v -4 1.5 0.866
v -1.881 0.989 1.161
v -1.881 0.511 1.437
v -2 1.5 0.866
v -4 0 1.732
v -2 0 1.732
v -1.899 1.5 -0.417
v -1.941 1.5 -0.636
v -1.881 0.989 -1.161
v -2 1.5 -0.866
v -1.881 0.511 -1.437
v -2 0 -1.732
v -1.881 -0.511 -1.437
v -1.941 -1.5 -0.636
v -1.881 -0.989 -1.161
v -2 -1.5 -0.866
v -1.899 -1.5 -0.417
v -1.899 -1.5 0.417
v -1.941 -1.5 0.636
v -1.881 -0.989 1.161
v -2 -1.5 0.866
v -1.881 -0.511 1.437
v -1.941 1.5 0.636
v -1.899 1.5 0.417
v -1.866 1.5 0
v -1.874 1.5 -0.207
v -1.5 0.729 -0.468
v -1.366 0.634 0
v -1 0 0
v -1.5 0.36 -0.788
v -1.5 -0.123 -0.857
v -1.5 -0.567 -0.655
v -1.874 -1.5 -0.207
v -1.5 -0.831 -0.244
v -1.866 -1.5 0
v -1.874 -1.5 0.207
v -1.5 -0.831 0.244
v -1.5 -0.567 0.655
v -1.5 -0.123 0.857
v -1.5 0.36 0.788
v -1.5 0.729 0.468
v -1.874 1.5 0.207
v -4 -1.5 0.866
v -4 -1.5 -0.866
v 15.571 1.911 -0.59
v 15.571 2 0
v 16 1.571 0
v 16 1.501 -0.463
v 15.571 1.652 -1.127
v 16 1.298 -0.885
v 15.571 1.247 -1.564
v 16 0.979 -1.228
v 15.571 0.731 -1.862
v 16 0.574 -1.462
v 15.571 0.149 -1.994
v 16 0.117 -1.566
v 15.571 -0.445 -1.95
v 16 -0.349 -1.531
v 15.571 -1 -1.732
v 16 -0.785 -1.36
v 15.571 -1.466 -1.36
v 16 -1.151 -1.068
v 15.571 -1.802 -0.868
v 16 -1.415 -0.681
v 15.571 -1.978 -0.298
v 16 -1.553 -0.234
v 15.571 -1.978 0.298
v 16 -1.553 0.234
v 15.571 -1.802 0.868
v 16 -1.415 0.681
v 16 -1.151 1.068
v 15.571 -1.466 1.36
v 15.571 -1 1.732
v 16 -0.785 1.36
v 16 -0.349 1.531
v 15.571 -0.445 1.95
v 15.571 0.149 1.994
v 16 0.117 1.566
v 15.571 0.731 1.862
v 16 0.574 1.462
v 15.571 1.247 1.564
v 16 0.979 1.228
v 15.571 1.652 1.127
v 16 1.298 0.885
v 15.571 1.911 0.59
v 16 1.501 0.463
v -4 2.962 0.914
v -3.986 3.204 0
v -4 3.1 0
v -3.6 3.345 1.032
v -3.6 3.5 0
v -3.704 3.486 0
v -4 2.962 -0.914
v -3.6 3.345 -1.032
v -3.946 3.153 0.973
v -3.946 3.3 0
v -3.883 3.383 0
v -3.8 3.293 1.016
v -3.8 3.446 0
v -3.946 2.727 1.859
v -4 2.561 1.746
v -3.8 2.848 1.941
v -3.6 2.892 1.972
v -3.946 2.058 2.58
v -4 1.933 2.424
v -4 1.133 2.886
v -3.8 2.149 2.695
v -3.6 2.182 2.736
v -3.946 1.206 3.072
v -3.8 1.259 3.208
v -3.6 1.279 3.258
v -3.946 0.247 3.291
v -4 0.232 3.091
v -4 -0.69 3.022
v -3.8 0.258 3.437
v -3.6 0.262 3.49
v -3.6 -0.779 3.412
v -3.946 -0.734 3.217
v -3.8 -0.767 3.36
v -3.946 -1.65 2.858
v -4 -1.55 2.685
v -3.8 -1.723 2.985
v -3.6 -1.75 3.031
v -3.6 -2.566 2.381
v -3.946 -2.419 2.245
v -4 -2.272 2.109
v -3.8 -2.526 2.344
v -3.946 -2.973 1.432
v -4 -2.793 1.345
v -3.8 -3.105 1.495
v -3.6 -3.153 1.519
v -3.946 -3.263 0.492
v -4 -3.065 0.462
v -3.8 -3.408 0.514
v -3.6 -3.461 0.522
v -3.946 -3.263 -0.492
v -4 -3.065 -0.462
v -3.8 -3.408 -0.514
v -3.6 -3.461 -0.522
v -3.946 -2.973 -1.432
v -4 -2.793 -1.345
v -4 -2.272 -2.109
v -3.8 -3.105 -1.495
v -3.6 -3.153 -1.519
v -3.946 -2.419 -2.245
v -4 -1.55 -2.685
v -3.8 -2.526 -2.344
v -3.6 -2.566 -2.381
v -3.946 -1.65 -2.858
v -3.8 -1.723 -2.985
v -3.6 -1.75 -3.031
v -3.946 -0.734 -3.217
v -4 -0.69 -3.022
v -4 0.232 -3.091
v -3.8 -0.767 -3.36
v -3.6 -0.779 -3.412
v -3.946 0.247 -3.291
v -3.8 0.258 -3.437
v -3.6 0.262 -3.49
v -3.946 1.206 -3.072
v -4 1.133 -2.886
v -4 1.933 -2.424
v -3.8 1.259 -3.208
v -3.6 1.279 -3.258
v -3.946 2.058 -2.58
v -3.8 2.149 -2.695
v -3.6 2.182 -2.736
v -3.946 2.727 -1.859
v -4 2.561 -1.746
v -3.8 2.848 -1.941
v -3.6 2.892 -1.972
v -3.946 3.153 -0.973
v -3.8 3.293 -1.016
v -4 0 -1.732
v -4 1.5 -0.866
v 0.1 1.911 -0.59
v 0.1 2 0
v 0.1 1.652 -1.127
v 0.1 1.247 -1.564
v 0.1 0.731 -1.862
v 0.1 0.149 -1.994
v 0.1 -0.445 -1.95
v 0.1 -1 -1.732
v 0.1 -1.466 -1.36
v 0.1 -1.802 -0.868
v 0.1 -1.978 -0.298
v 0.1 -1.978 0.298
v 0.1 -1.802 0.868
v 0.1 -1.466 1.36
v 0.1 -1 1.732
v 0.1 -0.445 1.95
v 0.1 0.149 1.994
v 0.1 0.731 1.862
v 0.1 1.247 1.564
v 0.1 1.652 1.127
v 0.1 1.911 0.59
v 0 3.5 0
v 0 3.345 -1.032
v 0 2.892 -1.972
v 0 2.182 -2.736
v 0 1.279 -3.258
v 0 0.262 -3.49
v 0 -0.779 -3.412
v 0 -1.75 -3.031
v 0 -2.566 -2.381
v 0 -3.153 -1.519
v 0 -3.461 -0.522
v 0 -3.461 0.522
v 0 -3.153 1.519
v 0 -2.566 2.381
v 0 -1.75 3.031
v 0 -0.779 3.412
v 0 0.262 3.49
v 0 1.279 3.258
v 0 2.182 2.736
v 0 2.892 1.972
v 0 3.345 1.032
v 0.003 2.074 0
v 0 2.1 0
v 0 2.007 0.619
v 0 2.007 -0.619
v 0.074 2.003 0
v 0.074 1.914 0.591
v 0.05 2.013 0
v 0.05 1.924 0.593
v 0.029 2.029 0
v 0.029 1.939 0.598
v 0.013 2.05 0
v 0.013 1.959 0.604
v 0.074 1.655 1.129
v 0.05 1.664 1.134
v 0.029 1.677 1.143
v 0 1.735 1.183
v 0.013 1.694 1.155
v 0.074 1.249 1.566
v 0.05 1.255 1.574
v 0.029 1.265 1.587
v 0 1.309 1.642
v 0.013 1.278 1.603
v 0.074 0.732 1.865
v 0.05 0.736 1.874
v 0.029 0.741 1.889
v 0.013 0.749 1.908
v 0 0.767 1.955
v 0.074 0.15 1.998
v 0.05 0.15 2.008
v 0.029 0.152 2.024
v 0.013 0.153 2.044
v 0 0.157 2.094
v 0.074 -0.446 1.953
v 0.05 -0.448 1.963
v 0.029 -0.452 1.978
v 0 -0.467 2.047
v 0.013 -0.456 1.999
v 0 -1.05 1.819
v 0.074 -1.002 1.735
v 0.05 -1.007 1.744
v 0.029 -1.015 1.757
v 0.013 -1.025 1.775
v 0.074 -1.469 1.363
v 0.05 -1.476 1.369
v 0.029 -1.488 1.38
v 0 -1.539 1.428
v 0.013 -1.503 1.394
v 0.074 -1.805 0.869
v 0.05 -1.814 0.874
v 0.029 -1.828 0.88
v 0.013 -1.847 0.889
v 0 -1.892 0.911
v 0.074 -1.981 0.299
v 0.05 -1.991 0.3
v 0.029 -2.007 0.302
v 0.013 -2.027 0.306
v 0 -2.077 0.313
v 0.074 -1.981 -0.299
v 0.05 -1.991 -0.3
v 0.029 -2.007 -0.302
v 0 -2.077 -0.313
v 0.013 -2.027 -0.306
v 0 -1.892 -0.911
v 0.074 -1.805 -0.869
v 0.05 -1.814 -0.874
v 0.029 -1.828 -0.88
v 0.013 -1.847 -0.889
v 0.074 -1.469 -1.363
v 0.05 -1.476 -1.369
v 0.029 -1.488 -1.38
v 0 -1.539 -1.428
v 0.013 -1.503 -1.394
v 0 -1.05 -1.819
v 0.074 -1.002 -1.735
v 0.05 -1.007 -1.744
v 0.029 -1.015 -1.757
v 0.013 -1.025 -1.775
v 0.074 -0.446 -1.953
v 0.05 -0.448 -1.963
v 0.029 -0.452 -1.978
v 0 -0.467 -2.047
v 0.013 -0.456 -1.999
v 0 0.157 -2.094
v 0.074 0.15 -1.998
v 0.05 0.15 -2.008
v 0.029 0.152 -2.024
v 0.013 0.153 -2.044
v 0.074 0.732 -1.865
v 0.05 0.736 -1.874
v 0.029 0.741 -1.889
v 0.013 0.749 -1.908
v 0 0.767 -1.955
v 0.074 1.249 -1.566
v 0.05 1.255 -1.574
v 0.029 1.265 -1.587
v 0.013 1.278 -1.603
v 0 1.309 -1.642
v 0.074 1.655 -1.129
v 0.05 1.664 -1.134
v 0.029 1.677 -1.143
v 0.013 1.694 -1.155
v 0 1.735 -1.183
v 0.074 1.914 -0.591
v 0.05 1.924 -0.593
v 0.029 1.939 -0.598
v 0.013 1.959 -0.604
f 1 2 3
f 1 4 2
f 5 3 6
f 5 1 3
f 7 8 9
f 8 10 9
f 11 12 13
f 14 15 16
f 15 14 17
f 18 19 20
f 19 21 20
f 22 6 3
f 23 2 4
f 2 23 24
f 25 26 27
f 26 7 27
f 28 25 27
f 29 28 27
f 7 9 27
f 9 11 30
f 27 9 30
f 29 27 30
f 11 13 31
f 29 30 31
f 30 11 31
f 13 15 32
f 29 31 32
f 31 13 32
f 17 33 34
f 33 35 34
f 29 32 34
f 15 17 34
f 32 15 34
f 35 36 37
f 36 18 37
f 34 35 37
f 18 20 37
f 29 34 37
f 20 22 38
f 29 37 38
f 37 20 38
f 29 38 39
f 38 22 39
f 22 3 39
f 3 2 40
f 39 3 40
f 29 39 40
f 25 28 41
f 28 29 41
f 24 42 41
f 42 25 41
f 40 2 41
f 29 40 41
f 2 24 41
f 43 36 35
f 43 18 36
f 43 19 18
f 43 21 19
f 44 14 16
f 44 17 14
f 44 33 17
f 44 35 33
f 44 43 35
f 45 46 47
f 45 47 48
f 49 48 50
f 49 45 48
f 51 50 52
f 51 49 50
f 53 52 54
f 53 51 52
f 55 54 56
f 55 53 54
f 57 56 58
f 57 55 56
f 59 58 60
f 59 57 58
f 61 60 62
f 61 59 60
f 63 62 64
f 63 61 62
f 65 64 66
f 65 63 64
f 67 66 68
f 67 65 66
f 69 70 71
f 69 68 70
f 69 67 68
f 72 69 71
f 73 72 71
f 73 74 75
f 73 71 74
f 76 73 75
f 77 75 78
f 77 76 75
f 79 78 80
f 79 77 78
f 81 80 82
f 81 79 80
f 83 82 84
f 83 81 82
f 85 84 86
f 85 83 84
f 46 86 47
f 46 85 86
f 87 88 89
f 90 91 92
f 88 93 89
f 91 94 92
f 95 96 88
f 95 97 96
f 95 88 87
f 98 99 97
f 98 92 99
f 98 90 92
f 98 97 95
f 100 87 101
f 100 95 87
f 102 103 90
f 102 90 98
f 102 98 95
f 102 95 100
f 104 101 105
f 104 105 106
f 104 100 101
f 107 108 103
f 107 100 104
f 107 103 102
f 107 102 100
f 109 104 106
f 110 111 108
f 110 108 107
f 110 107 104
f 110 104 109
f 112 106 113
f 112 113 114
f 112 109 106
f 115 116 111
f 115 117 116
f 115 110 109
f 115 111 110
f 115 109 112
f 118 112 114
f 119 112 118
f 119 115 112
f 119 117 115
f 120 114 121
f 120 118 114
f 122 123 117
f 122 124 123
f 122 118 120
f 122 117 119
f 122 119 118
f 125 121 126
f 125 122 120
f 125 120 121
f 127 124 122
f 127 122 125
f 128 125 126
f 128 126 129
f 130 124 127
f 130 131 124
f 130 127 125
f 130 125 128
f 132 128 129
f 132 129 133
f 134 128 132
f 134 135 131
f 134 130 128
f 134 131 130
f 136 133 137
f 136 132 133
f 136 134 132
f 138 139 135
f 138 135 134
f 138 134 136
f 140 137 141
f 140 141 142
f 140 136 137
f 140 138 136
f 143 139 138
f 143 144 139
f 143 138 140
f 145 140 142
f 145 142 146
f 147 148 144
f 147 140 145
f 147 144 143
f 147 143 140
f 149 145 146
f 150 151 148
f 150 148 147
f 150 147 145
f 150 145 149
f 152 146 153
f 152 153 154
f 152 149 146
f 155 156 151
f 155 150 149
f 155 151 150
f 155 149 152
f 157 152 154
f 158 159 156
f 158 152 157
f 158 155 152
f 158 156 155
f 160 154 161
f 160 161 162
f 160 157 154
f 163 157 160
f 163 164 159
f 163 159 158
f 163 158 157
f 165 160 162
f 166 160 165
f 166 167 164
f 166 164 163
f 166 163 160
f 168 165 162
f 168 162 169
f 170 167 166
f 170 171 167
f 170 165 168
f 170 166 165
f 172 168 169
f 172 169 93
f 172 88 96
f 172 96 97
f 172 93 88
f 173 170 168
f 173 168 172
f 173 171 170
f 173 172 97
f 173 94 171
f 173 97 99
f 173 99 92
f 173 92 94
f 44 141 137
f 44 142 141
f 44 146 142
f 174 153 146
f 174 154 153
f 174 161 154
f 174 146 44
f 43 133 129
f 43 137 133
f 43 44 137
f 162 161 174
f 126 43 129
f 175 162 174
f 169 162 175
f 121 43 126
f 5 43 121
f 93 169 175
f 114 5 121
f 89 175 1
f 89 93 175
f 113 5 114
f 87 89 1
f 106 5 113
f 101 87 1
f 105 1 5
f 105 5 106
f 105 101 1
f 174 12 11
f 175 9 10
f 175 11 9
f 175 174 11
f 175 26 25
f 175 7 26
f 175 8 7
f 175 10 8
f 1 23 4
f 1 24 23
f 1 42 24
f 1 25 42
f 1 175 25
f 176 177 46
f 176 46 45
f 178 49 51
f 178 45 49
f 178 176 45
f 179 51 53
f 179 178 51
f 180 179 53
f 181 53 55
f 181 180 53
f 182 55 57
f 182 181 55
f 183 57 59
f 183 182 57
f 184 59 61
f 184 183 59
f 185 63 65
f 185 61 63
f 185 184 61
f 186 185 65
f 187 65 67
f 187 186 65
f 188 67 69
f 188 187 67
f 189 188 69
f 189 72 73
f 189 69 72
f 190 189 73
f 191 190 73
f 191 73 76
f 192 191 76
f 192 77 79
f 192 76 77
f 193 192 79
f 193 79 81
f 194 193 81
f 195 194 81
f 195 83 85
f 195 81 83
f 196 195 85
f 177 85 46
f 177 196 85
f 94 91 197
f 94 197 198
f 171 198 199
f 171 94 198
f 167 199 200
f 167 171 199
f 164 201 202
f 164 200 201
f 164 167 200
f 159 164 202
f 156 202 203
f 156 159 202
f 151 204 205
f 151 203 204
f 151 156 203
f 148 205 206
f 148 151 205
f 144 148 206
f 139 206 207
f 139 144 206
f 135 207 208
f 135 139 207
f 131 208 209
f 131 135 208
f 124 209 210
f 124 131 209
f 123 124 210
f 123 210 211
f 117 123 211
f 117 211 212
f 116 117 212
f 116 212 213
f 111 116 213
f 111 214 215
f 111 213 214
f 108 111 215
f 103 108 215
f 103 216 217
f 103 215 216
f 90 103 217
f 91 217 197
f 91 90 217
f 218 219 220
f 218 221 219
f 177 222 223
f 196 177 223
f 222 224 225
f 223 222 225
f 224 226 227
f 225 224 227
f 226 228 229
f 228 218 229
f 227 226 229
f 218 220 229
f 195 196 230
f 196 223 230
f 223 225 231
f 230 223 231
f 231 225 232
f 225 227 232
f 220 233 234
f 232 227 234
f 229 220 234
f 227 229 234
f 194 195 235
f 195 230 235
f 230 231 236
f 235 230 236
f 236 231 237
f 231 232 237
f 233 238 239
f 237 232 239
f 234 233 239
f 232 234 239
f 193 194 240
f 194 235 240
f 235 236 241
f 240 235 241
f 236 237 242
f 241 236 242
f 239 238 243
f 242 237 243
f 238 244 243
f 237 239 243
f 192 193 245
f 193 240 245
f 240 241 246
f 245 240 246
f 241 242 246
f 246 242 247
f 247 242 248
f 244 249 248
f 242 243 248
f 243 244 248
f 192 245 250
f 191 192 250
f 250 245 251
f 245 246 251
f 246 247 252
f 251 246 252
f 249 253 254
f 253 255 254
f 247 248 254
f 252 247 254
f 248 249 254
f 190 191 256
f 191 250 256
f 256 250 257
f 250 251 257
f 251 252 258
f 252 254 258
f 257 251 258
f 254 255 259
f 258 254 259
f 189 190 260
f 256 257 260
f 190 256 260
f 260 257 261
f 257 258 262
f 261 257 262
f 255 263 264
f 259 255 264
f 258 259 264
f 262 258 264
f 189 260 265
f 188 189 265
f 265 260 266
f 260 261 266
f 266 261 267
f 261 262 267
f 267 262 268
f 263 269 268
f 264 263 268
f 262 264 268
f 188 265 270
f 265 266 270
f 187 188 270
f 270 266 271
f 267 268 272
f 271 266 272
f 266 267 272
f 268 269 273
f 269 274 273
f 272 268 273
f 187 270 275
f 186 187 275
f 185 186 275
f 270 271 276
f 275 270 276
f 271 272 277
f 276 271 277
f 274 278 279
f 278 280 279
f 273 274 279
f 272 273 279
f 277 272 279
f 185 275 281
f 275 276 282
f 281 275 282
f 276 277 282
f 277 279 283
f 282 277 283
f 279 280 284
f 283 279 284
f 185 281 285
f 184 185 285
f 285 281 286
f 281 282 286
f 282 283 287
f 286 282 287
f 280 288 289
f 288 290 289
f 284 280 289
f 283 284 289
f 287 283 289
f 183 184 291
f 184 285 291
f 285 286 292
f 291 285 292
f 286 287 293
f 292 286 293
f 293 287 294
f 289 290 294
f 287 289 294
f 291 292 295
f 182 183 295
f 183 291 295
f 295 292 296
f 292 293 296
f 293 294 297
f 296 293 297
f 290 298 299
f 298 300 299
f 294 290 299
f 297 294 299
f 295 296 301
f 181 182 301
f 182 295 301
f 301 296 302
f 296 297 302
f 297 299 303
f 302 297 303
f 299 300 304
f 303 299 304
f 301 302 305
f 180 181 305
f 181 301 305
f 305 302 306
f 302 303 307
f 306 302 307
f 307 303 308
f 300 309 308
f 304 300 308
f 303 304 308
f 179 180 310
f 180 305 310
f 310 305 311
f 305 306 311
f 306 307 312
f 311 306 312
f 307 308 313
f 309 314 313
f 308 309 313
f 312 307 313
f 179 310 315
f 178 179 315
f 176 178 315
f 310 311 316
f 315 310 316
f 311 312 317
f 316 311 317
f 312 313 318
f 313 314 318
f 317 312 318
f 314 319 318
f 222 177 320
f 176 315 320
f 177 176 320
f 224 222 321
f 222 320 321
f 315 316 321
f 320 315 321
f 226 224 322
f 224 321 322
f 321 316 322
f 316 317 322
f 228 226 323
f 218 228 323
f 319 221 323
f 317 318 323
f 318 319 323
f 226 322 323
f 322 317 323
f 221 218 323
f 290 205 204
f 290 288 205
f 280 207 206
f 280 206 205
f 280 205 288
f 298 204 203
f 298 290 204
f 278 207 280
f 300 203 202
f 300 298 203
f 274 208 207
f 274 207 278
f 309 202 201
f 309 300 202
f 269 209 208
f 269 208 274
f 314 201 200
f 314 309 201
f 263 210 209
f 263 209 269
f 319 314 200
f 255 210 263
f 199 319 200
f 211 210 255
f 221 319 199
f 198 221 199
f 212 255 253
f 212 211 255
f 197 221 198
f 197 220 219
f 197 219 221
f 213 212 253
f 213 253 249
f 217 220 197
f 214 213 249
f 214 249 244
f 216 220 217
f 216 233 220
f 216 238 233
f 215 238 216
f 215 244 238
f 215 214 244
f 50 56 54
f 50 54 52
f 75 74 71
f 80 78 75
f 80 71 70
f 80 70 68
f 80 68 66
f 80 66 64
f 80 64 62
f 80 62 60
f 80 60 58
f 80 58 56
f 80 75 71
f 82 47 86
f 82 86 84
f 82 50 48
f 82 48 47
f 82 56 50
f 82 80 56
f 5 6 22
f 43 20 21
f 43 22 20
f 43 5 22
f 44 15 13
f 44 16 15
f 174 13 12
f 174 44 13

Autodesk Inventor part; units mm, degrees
ref_plane "YZ Plane" through (0, 0, 0) normal (1, 0, 0) x (0, 1, 0)
ref_plane "XZ Plane" through (0, 0, 0) normal (0, 1, 0) x (-1, 0, 0)
sketch "Sketch1" plane through (0, 0, 0) normal (0, 0, 1) x (1, 0, 0)
  line L0 (-1, 0) -> (16, 0)
  line L1 (16, 0) -> (16, 2)
  line L2 (16, 2) -> (2, 2)
  line L3 (2, 2) -> (1.5705, 2)
  line L4 (1.5705, 2) -> (0, 2)
  line L5 (0, 2) -> (0, 3.5)
  line L6 (0, 3.5) -> (-4, 3.5)
  line L7 (-4, 3.5) -> (-4, 1.7321)
  line L8 (-4, 1.7321) -> (-2, 1.7321)
  line L9 (-2, 1.7321) -> (-1, 0)
  line L10 (-8, 0) -> (20, 0) projected
  line L11 (0, -0.7) -> (0, 4.2) projected
  line L12 (2, 2) -> (0, 2) construction
  dimension "d1" = 14
  dimension "d2" = 0.4295
  dimension "d3" = 4
  dimension "d4" = 2
  dimension "d5" = 60
  dimension "d6" = 4
  dimension "d7" = 4
  dimension "d8" = 3.4641
  dimension "d9" = 7
  dimension "d26" = 16
revolve "Body" add sketch "Sketch1" angle 360 about axis through (-1, 0, 0) along (1, 0, 0)
sketch "Sketch2" plane through (-4, 0, 0) normal (-1, 0, 0) x (0, 0, 1)
  circle A0 centre (0, 0) radius 1.7321 projected
  line L0 (0, -4.9) -> (0, 4.9) projected
  line L1 (-4.9, 0) -> (4.9, 0) projected
  line L2 (1.7321, 0) -> (0.866, -1.5)
  line L3 (0.866, -1.5) -> (-0.866, -1.5)
  line L4 (-0.866, -1.5) -> (-1.7321, 0)
  line L5 (-1.7321, 0) -> (-0.866, 1.5)
  line L6 (-0.866, 1.5) -> (0.866, 1.5)
  line L7 (0.866, 1.5) -> (1.7321, 0)
extrude "Slot" add sketch "Sketch2" against normal up to next contours L7 A0 | A0 L2 | L6 L0 A0 | A0 L0 L3 | L0 L6 A0 | A0 L3 L0 | L4 A0 | A0 L5
fillet "Fillet1" radius 0.4 1 edges at (-4, -3.5, 0)
thread "Thread" size "M4x0.7" class "6g" standard "ISO Metric profile" length 14
chamfer "Chamfer1" distance 0.4294 distance2 0.4294 1 edges at (16, -2, 0) measured on face at (16, 0.527, -0.2661)
ref_plane "Work Plane1" through (29, 0, 0) normal (0, -1, 0) x (1, 0, 0)
fillet "Fillet2" radius 0.1 1 edges at (0, -2, 0)
equation "\"d1\" = GEL"
equation "\"d3\" = KOH"
equation "\"d4\" = INTI"
equation "\"d6\" = GD"
equation "\"d7\" = BDM"
equation "\"d8\" = 1.1547 * SW"
equation "\"d9\" = KOD"
equation "\"d26\" = NLG"
equation "\"d30\" = R"
equation "\"d17\" = RR"
equation "\"d13\" = GEL"
equation "\"d15\" = -0.5 * SPD + 0.5 * GD"
equation "\"d16\" = GUL"
equation "\"GD\" = NND"
equation "\"NLG\" = 16"
equation "\"GEL\" = 14"
equation "\"KOD\" = 7"
equation "\"KOH\" = NND"
equation "\"INTI\" = 2"
equation "\"GAL\" = 0.61345 * PTC"
equation "\"GUL\" = 0.61345 * PTC"
equation "\"BDM\" = NND"
equation "\"SW\" = 3"
equation "\"RR\" = 0.1 * NND"
equation "\"SPD\" = NND - 1.2269 * PTC"
equation "\"R\" = 0.1"
equation "\"PHH\" = 0.13"
equation "\"GD1\" = THREADDIA - 1.2269 * PTC"
equation "\"THREADDIA\" = 4"
equation "\"FAWI\" = 45deg"
equation "\"PTC\" = 0.7"
equation "\"KOH1\" = 3.6"
equation "\"NND\" = 4"
equation "\"TOA\" = 30deg"
equation "\"E0\" = 1.155 * SW"
properties part number "AS 1420 - 1973 - M4 x 16" material "Steel, Mild"
